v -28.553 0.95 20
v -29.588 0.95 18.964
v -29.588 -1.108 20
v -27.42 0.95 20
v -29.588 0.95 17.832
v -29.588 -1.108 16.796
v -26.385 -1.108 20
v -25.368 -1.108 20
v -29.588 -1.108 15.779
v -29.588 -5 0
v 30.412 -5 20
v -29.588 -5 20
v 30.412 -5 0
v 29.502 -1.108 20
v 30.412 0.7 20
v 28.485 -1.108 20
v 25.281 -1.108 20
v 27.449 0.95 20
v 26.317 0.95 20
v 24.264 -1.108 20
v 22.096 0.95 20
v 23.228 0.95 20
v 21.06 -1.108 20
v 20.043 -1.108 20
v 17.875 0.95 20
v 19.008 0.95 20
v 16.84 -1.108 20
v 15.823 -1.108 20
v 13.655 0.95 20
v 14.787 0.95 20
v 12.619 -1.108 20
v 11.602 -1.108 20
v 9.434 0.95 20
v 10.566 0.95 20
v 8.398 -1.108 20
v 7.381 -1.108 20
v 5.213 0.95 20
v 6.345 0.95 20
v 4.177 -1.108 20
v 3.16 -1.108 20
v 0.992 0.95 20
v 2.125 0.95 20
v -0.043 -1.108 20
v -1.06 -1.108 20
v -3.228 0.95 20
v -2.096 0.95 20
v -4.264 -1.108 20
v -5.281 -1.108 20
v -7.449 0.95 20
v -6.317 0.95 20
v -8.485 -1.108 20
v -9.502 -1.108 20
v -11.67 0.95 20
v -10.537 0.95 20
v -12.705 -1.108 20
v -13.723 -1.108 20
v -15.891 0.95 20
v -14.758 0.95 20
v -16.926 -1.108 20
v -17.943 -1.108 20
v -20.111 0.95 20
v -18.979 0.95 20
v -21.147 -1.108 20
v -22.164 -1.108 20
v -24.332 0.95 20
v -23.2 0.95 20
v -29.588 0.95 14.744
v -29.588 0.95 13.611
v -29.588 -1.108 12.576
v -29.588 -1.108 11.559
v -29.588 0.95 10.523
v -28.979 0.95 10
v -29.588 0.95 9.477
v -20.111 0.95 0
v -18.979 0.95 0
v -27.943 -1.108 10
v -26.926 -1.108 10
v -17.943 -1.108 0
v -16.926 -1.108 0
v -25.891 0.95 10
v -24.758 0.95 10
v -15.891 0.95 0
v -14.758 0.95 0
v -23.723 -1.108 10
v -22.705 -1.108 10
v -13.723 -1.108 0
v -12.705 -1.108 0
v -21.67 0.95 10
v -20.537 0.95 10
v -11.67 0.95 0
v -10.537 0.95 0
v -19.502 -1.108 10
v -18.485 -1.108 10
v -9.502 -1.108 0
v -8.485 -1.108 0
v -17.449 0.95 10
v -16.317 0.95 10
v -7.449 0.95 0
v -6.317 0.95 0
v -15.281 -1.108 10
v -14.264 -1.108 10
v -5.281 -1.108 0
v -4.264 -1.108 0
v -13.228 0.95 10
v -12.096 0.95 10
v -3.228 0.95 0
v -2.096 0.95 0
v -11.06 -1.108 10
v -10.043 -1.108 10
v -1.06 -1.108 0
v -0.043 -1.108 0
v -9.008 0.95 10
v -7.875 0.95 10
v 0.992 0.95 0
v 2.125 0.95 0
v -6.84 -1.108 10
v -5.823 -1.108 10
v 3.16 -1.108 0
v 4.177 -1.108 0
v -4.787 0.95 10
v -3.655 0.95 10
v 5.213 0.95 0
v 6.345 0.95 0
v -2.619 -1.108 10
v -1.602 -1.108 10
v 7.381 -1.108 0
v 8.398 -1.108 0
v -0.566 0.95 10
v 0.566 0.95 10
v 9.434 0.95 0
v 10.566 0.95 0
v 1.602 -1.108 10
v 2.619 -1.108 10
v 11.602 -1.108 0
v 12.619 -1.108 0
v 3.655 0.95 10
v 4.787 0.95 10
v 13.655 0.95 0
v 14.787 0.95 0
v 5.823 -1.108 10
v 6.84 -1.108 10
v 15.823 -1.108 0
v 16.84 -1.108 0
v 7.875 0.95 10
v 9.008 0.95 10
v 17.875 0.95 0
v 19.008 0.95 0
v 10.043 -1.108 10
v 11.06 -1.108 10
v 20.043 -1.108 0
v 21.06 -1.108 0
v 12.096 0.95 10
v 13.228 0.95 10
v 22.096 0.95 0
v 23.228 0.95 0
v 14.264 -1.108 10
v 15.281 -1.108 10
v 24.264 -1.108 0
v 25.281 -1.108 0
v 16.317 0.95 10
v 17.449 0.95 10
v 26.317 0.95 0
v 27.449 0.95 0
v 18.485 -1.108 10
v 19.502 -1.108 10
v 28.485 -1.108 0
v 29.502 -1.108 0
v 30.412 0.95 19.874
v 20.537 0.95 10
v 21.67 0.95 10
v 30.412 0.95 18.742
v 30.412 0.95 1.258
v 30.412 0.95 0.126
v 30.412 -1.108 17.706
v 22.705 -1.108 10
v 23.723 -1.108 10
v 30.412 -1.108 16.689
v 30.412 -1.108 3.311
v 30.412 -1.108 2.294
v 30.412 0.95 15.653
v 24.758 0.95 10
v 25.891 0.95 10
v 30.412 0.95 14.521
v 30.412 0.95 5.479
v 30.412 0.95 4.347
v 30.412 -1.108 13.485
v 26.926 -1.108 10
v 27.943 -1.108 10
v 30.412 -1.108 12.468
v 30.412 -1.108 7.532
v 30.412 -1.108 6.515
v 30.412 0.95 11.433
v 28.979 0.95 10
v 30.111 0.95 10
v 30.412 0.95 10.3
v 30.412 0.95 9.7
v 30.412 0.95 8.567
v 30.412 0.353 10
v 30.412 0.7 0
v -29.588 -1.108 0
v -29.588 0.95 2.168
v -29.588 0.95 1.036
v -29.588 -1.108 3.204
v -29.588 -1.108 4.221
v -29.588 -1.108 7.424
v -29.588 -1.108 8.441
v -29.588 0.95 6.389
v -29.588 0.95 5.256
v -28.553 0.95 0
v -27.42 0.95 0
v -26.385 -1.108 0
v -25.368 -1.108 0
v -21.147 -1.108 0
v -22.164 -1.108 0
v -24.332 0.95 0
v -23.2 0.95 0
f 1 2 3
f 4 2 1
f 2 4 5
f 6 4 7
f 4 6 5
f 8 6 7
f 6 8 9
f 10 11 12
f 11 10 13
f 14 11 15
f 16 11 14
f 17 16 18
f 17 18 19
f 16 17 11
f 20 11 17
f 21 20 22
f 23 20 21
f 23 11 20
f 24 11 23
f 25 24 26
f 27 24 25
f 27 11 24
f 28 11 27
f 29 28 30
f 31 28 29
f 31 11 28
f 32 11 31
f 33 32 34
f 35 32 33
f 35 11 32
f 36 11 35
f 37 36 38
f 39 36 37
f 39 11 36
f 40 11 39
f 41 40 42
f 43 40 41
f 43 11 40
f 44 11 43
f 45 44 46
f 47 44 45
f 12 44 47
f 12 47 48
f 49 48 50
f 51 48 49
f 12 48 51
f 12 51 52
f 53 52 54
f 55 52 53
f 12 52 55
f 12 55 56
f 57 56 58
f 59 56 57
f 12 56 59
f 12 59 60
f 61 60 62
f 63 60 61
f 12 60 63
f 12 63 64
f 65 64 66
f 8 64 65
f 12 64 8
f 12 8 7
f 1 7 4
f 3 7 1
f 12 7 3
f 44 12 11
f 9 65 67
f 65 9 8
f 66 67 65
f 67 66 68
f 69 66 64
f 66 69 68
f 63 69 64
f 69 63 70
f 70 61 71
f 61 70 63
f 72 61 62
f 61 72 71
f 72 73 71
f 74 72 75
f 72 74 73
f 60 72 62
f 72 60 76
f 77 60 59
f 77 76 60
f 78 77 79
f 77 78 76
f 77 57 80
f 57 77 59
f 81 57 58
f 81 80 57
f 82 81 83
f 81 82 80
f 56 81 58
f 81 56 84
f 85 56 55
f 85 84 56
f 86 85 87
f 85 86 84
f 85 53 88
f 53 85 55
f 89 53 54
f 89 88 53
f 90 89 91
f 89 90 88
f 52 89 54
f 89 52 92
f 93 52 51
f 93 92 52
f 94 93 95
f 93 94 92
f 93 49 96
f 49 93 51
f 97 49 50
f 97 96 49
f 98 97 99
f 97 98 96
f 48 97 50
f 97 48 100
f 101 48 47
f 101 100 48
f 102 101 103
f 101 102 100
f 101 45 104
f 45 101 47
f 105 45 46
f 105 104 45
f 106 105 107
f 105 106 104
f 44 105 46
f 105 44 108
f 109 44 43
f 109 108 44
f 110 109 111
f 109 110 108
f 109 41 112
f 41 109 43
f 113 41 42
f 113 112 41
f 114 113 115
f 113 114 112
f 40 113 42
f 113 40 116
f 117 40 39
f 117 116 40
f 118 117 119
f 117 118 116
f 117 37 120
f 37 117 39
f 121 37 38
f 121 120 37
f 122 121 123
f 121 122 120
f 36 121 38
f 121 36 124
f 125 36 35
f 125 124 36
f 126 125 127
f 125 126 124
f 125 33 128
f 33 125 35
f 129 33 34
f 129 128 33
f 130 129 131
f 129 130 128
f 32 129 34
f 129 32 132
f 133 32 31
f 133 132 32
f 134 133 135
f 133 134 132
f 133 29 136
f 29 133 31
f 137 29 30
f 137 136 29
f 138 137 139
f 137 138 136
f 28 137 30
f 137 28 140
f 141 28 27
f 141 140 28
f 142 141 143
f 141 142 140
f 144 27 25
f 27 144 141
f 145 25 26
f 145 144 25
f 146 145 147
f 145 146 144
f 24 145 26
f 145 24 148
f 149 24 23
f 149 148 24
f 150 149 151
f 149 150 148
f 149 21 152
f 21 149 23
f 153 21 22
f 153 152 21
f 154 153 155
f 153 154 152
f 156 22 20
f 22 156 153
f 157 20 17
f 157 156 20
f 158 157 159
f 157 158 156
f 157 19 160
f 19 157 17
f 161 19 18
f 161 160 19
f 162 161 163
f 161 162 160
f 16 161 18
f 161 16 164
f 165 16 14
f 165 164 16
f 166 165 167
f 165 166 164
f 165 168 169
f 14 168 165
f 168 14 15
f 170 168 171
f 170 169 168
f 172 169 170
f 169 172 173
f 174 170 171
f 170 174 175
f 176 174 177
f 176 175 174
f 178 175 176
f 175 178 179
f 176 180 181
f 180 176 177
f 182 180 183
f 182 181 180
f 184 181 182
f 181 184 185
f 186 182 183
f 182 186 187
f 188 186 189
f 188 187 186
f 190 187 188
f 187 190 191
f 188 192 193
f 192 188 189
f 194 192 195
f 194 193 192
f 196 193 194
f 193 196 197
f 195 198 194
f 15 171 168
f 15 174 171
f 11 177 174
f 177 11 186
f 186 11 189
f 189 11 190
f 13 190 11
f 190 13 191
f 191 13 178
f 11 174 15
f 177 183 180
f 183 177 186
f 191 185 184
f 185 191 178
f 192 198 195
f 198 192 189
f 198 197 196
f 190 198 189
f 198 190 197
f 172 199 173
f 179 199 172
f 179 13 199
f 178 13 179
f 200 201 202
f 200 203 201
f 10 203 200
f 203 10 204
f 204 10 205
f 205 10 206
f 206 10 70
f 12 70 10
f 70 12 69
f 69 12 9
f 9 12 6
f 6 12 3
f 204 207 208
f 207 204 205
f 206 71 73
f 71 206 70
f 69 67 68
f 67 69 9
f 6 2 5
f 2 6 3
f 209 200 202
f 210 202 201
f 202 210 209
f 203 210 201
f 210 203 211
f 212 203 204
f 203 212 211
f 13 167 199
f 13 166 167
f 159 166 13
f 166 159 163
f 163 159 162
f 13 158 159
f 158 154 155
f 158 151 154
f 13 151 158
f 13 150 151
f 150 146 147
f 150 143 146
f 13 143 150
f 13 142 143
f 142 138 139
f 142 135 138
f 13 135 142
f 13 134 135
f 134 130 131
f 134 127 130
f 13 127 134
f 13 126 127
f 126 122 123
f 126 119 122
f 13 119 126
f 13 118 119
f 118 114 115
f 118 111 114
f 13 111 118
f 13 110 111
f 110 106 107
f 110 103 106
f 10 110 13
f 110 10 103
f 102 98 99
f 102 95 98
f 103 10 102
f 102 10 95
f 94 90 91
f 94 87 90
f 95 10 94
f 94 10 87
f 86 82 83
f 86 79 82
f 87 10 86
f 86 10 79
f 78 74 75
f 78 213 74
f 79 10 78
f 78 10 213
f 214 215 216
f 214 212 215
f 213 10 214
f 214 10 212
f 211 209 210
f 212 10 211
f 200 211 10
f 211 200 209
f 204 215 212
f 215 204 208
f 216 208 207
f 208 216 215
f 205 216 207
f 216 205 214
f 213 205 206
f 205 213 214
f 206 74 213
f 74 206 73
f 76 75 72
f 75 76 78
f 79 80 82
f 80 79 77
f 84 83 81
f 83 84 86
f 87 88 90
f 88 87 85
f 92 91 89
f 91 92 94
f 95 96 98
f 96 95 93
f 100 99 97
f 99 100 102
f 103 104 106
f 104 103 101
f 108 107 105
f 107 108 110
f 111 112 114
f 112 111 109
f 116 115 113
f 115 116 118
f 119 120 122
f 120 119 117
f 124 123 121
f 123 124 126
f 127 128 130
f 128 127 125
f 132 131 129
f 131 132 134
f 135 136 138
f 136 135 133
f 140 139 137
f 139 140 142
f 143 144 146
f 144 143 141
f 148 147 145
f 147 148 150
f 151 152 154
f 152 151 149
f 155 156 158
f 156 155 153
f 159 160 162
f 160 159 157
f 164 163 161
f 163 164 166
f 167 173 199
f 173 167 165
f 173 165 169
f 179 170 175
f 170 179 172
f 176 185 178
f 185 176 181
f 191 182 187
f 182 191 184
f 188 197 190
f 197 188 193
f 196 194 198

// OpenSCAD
include <../gears.scad>

herringbone_rack(modul=1, length=60, height=5, width=20, pressure_angle=20, helix_angle=45);
